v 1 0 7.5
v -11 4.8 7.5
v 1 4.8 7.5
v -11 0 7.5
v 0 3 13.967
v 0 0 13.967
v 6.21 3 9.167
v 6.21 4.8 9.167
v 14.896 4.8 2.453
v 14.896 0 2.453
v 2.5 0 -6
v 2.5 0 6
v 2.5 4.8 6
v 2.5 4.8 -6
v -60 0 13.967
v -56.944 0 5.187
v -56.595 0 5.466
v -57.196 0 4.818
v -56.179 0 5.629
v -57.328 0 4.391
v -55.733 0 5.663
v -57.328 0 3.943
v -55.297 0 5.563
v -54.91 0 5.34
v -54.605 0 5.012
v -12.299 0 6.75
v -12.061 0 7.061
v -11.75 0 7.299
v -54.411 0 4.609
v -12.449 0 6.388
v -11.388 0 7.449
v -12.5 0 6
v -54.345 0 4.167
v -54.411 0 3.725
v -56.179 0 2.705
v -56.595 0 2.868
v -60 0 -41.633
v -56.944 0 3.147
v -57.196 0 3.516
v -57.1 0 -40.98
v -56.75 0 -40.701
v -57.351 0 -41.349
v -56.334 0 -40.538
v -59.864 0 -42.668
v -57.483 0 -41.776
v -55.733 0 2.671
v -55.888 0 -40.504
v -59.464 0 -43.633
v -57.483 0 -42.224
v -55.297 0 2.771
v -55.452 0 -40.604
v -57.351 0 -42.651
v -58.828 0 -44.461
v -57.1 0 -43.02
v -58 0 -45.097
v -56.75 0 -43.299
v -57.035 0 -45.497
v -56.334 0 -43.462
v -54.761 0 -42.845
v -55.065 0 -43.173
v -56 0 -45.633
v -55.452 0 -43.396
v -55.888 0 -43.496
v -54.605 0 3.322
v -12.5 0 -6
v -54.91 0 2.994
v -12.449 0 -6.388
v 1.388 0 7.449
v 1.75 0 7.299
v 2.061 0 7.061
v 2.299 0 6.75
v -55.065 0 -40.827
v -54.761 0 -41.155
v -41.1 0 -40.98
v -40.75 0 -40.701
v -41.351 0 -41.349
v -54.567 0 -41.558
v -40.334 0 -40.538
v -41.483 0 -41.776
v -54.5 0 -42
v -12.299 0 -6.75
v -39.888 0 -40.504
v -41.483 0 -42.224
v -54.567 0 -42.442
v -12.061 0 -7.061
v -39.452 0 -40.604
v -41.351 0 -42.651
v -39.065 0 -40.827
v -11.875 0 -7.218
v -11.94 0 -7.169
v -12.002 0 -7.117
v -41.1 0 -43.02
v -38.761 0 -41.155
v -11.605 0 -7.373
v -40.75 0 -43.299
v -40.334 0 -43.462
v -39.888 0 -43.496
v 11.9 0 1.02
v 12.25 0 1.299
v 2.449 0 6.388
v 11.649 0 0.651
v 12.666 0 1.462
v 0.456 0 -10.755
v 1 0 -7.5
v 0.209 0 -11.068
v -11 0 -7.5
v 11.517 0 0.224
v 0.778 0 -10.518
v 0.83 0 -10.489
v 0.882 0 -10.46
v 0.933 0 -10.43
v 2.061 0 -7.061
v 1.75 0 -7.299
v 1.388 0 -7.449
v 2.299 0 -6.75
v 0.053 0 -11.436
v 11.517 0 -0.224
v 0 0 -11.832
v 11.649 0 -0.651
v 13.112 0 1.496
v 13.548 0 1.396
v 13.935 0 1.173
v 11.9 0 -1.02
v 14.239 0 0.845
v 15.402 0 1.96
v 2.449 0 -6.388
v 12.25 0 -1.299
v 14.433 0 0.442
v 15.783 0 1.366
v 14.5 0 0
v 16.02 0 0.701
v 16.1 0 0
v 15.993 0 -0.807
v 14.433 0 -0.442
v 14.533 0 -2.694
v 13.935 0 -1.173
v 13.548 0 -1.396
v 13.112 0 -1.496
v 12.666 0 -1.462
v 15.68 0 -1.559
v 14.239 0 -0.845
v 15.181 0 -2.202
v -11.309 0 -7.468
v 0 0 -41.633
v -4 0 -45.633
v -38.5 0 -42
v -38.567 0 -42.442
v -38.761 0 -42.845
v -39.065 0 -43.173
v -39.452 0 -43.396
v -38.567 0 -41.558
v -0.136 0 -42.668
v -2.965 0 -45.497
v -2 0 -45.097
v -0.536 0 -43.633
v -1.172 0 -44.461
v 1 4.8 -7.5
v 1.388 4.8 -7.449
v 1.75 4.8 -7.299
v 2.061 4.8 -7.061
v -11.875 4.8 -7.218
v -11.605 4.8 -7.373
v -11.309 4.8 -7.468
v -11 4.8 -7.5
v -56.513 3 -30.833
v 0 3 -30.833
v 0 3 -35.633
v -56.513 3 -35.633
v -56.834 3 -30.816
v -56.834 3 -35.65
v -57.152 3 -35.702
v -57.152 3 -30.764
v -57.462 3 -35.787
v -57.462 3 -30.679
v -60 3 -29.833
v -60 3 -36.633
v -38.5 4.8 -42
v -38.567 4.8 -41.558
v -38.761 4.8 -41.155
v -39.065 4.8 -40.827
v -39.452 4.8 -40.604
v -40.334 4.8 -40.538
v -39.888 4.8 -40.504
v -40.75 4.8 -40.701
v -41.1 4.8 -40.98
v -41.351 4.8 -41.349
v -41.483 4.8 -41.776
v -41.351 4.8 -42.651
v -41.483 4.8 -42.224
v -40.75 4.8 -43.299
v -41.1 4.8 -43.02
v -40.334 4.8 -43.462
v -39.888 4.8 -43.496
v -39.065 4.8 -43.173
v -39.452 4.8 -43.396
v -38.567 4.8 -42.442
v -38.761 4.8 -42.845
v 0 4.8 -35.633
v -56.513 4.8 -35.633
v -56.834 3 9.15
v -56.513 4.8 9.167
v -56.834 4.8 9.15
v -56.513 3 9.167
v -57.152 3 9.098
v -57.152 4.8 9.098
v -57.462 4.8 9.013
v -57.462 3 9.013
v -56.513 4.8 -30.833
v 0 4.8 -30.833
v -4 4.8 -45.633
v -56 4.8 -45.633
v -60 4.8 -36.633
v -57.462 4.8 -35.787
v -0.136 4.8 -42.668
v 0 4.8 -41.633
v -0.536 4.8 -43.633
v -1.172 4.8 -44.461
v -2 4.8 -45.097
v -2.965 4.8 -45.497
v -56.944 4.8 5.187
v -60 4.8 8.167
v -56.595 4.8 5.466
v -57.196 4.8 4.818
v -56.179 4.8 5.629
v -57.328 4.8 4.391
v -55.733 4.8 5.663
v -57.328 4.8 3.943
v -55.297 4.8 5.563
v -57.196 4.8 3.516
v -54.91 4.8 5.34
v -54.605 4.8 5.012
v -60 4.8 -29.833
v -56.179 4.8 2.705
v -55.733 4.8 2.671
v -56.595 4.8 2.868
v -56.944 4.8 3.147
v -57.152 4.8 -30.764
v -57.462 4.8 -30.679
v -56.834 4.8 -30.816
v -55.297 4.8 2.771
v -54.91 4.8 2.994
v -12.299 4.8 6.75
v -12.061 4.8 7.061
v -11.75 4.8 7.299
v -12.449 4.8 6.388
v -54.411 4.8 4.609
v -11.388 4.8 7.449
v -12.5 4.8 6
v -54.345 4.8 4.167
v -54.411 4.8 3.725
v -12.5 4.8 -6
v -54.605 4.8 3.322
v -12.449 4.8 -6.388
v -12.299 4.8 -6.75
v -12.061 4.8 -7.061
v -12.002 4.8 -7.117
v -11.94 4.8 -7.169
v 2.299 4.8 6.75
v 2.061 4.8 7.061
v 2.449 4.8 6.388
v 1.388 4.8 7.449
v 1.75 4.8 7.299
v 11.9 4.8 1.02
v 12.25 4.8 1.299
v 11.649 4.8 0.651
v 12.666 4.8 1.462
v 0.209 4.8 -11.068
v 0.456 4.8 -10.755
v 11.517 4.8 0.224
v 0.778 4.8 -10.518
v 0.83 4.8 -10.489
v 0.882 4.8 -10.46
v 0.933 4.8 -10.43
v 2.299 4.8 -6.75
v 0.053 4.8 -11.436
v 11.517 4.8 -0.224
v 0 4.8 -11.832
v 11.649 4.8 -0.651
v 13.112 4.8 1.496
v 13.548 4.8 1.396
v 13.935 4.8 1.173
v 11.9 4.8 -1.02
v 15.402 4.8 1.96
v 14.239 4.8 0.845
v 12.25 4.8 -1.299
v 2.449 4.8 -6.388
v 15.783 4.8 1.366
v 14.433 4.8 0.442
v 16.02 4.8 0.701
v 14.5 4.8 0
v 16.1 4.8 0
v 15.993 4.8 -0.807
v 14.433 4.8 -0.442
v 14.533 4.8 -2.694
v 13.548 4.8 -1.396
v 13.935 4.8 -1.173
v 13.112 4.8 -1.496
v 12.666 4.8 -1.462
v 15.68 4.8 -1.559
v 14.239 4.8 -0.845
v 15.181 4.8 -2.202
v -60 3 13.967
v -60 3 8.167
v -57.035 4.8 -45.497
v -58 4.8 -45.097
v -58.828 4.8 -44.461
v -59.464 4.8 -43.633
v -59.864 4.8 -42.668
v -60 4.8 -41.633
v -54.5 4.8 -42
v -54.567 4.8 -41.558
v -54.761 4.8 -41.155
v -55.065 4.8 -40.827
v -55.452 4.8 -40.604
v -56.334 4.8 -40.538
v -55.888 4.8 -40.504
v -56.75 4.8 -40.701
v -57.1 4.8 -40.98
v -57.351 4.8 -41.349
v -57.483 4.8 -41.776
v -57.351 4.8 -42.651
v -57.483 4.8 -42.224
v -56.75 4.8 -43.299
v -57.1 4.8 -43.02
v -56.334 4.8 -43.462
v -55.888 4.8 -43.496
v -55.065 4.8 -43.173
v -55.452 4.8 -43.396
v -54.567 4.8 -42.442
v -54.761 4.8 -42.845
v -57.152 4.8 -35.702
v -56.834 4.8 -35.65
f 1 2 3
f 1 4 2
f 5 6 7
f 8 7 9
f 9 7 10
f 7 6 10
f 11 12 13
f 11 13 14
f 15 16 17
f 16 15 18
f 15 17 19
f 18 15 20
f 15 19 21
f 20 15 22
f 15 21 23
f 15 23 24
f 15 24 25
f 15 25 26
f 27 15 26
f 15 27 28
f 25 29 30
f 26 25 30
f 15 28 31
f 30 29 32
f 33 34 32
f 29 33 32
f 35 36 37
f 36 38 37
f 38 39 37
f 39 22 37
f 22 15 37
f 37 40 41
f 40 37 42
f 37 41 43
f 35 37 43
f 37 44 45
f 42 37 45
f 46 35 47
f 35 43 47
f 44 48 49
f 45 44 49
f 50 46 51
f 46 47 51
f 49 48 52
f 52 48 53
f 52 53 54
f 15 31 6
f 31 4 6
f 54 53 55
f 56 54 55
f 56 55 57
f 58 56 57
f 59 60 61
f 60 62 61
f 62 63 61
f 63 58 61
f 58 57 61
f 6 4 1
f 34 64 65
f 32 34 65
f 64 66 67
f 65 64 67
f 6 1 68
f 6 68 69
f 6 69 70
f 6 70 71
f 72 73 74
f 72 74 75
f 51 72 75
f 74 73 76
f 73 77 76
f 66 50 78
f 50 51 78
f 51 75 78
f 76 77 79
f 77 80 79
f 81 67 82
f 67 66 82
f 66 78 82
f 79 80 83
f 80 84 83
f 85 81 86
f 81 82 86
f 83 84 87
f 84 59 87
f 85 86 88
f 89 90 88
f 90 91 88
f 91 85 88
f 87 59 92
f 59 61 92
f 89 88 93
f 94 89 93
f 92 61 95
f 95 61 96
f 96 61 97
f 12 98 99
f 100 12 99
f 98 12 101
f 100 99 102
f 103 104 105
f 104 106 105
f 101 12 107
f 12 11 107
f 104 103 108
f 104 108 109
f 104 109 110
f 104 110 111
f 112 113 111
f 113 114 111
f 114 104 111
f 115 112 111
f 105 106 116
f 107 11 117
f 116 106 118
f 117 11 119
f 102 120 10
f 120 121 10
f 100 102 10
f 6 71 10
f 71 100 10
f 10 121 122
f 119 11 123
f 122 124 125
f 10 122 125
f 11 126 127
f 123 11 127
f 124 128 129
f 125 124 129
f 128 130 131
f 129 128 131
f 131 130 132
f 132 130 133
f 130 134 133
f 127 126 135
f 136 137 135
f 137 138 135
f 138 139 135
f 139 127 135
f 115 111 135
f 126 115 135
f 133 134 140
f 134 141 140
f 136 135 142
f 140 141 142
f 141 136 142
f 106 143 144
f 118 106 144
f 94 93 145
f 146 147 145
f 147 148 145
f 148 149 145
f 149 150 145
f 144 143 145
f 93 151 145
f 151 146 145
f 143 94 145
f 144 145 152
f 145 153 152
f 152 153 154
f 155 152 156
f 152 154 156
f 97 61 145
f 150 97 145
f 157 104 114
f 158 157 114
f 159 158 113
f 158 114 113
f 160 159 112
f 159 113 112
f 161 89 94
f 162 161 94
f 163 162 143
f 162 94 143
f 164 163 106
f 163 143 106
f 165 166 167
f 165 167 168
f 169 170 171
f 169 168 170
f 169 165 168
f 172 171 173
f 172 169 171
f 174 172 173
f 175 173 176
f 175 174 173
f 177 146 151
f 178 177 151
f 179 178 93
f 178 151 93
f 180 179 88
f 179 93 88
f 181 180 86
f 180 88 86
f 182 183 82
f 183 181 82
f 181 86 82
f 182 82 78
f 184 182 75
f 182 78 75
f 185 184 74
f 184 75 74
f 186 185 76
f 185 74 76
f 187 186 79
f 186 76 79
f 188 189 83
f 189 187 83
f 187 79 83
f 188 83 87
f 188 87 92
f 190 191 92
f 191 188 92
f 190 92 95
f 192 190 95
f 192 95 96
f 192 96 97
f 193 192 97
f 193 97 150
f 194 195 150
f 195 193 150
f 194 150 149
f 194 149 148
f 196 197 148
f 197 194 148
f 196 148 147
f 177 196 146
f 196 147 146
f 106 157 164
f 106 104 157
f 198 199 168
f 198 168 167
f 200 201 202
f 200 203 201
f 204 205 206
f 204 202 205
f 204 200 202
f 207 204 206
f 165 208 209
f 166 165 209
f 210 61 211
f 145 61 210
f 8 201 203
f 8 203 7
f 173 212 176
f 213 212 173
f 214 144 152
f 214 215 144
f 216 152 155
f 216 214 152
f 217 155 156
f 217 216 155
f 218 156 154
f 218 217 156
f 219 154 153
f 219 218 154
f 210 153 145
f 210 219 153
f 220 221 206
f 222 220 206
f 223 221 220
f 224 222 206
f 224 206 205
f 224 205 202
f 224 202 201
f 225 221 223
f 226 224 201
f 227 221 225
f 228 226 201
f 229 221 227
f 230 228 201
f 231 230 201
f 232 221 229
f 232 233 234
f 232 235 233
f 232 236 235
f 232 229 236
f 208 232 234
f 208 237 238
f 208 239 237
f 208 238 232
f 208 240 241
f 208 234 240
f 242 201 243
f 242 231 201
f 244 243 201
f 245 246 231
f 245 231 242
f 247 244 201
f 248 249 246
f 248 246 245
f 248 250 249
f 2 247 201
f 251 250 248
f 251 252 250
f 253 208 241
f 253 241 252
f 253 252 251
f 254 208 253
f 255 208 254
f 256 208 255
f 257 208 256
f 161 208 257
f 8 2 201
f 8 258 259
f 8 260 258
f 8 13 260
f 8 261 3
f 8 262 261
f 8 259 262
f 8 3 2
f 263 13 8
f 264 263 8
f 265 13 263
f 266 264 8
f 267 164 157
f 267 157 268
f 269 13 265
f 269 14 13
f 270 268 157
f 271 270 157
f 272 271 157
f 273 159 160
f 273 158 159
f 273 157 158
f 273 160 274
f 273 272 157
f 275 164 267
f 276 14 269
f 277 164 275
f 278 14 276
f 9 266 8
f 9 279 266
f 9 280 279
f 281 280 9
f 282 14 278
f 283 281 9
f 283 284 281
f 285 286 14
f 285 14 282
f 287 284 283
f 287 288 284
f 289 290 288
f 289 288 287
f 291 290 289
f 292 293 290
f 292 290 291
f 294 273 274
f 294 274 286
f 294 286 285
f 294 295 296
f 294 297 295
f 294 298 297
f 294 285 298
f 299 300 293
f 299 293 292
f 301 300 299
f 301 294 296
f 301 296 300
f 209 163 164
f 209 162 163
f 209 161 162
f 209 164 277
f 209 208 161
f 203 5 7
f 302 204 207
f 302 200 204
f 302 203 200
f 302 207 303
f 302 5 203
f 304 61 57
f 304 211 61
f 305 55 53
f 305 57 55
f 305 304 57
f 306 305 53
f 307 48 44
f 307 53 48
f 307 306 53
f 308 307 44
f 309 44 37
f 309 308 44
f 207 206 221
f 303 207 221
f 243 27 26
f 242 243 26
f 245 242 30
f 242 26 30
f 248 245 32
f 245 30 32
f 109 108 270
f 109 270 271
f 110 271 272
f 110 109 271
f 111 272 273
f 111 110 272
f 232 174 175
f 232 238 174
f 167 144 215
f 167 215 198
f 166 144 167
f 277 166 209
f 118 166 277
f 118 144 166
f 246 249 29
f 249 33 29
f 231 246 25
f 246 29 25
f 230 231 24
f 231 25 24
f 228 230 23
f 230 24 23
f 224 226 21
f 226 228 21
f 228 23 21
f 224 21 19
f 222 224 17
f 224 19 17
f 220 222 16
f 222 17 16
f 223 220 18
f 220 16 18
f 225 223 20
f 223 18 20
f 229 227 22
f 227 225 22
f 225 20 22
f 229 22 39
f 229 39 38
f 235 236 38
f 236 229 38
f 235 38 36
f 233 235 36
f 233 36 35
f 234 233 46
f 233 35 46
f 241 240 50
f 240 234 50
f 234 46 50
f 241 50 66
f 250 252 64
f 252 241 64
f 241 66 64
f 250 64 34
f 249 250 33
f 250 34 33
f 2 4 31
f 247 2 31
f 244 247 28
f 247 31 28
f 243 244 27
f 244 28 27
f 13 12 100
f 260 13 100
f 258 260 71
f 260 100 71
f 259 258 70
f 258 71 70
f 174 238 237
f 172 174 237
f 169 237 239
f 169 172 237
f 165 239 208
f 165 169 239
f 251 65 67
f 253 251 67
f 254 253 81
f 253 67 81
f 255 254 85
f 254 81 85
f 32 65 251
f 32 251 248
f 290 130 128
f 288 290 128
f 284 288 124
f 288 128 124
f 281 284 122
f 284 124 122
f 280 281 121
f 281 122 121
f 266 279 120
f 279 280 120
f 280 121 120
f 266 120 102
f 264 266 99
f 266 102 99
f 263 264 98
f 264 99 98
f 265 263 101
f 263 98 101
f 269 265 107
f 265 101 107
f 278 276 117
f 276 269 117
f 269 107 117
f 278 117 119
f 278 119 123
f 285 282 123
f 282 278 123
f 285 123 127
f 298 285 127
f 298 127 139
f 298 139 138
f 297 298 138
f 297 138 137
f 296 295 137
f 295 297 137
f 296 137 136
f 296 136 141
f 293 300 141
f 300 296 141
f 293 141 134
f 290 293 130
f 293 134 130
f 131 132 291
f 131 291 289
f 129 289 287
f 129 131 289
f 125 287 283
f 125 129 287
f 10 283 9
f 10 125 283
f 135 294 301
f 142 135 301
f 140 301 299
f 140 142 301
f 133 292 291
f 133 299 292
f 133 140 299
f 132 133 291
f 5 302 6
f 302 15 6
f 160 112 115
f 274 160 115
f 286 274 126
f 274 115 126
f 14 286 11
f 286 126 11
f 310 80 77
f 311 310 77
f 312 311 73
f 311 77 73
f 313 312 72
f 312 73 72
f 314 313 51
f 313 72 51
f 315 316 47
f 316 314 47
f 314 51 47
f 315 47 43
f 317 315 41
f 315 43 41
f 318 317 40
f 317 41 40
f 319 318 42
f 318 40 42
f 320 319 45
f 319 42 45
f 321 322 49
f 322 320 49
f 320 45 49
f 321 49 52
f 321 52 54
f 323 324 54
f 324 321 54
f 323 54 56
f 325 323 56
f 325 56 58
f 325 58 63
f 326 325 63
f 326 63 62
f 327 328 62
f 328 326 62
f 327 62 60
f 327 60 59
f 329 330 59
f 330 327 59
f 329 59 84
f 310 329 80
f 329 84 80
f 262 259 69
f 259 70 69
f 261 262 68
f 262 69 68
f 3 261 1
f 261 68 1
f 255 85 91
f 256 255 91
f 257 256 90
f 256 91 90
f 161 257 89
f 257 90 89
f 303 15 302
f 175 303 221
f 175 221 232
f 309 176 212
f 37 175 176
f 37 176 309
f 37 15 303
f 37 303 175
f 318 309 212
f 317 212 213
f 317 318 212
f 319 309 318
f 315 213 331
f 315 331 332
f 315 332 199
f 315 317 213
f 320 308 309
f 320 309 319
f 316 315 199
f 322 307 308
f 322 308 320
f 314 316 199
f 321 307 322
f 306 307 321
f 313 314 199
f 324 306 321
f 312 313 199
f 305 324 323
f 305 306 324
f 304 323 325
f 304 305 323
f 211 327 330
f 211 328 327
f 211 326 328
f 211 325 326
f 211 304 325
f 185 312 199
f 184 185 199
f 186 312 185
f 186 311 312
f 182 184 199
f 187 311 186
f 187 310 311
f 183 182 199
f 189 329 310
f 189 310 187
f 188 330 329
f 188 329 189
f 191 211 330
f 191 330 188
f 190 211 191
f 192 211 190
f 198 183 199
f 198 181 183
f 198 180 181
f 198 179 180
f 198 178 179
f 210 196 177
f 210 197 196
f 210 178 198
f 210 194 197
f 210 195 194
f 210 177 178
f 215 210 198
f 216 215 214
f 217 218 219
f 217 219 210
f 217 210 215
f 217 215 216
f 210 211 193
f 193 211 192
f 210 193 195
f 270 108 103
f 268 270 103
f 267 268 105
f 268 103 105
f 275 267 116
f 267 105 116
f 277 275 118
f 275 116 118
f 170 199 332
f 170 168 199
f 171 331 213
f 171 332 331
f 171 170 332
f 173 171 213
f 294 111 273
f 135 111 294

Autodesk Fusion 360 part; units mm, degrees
sketch "Sketch1" plane through (0, 0, 0) normal (0, 1, 0) x (1, 0, 0)
  circle A0 centre (0, 0) radius 48 construction
  circle A1 centre (0, 0) radius 14 construction
  circle A2 centre (0, 0) radius 9.5 construction
  circle A3 centre (0, 0) radius 8 construction
  line L0 (0, 0) -> (8, 0) construction
  line L1 (0, 0) -> (0, -9.5) construction
  line L2 (0, 0) -> (-8, 0) construction
  line L3 (0, 0) -> (0, 9.5) construction
  circle A4 centre (8, 0) radius 1.5 construction
  circle A5 centre (-8, 0) radius 1.5 construction
  circle A6 centre (0, 9.5) radius 1.5 construction
  circle A7 centre (0, 0) radius 12 construction
  line L4 (8, 0) -> (18, 0) construction
  line L5 (21.1, 0) -> (19.55, 2.6847) construction
  line L6 (19.55, 2.6847) -> (16.45, 2.6847) construction
  line L7 (16.45, 2.6847) -> (14.9, 0) construction
  line L8 (14.9, 0) -> (16.45, -2.6847) construction
  line L9 (16.45, -2.6847) -> (19.55, -2.6847) construction
  line L10 (19.55, -2.6847) -> (21.1, 0) construction
  circle A8 centre (18, 0) radius 3.1 construction
  circle A9 centre (18, 0) radius 1.5
  line L11 (0, 52) -> (-68, 52) construction
  line L12 (-9.7468, 47) -> (-68, 47) construction
  line L13 (-68, 52) -> (-68, 47) construction
  line L14 (-68, 47) -> (-68, 35.633) construction
  line L15 (-68, 35.633) -> (-32.1604, 35.633) construction
  line L16 (-68, 35.633) -> (-68, 30.833) construction
  line L17 (-68, 30.833) -> (-36.7876, 30.833) construction
  line L18 (-68, 30.833) -> (-68, -9.167) construction
  line L19 (-60, -9.167) -> (-47.1165, -9.167)
  line L20 (-68, -9.167) -> (-68, -13.967) construction
  line L21 (-68, -13.967) -> (-45.923, -13.967) construction
  line L22 (-60, -13.967) -> (-60, 35.633)
  line L23 (5.9333, 10.4305) -> (19.5328, 2.6945)
  line L24 (-60, -13.967) -> (21.1, -13.967)
  line L25 (21.1, -13.967) -> (21.1, 0) construction
  arc A10 (21.1, 0) -> (19.5328, 2.6945) centre (18, 0) ccw
  line L26 (-60, 35.633) -> (5, 35.633)
  line L27 (5, 35.633) -> (5, 11.8322)
  arc A11 (5.9333, 10.4305) -> (5.7778, 10.5175) centre (0, 0) ccw
  arc A12 (5, 11.8322) -> (5.7778, 10.5175) centre (6.5, 11.8322) ccw
  arc A13 (5.7778, 10.5175) -> (7.9656, 11.513) centre (6.5, 11.8322) ccw construction
  arc A14 (5.4445, 12.898) -> (5, 11.8322) centre (6.5, 11.8322) ccw construction
  arc A15 (7.9656, 11.513) -> (5.4445, 12.898) centre (6.5, 11.8322) ccw construction
  line L28 (5, 11.8322) -> (5, 10.9087) construction
  arc A16 (5.7778, 10.5175) -> (5, 10.9087) centre (0, 0) ccw construction
  line L29 (-60, 30.833) -> (5, 30.833)
  line L30 (-47.1165, -9.167) -> (21.1, -9.167)
  line L31 (-60, 35.633) -> (-60, 45.633)
  line L32 (-60, 45.633) -> (5, 45.633)
  line L33 (5, 45.633) -> (5, 35.633)
  circle A17 centre (-56, 42) radius 1.5
  circle A18 centre (-40, 42) radius 1.5
  line L34 (-40, 42) -> (0, 0) construction
  circle A19 centre (-55.8448, -4.167) radius 1.5
  line L35 (0, 0) -> (-55.8448, -4.167) construction
  line L36 (-68, -9.167) -> (-60, -9.167) construction
  line L37 (-6, -7.5) -> (7.5, -7.5)
  line L38 (7.5, -7.5) -> (7.5, 7.5)
  line L39 (6, 7.5) -> (-7.5, 7.5)
  line L40 (-7.5, 7.5) -> (-7.5, -7.5)
  line L41 (-7.5, -7.5) -> (7.5, 7.5) construction
  line L42 (-7.5, 7.5) -> (7.5, -7.5) construction
  arc A20 (-7.5, -6) -> (-7.0607, -7.0607) centre (-6, -6) ccw
  arc A21 (-7.0607, -7.0607) -> (-6, -7.5) centre (-6, -6) ccw
  line L43 (-7.5, -7.5) -> (-6, -7.5)
  arc A22 (-6, -7.5) -> (-4.602, -6.5438) centre (-6, -6) ccw construction
  arc A23 (-4.9393, -4.9393) -> (-7.5, -6) centre (-6, -6) ccw construction
  arc A24 (-4.602, -6.5438) -> (-4.9393, -4.9393) centre (-6, -6) ccw construction
  arc A25 (6, -7.5) -> (7.0607, -7.0607) centre (6, -6) ccw
  arc A26 (7.0607, -7.0607) -> (7.5, -6) centre (6, -6) ccw
  arc A27 (7.5, -6) -> (6.5438, -4.602) centre (6, -6) ccw construction
  arc A28 (4.9393, -4.9393) -> (6, -7.5) centre (6, -6) ccw construction
  arc A29 (6.5438, -4.602) -> (4.9393, -4.9393) centre (6, -6) ccw construction
  arc A30 (7.0607, 7.0607) -> (6, 7.5) centre (6, 6) ccw
  arc A31 (7.5, 6) -> (7.0607, 7.0607) centre (6, 6) ccw
  arc A32 (6, 7.5) -> (6.5438, 4.602) centre (6, 6) ccw construction
  arc A33 (7.4916, 5.8417) -> (7.5, 6) centre (6, 6) ccw construction
  arc A34 (6.5438, 4.602) -> (7.4916, 5.8417) centre (6, 6) ccw construction
  arc A35 (-7.0607, 7.0607) -> (-7.5, 6) centre (-6, 6) ccw
  arc A36 (-6.8748, 7.2185) -> (-7.0607, 7.0607) centre (-6, 6) ccw
  arc A37 (-6, 7.5) -> (-6.8748, 7.2185) centre (-6, 6) ccw
  arc A38 (-7.5, 6) -> (-4.8256, 5.0669) centre (-6, 6) ccw construction
  arc A39 (-4.602, 6.5438) -> (-6, 7.5) centre (-6, 6) ccw construction
  arc A40 (-4.8256, 5.0669) -> (-4.602, 6.5438) centre (-6, 6) ccw construction
  line L44 (7.5, 7.5) -> (6, 7.5)
  line L45 (5, 11.8322) -> (5, -13.967) construction
  line L46 (5, -13.967) -> (19.8959, -2.4527)
  line L47 (18, 0) -> (21.1, 0) construction
  line L48 (18, 0) -> (19.8959, -2.4527) construction
  arc A41 (19.8959, -2.4527) -> (21.1, 0) centre (18, 0) ccw
  point P0 (18, 0)
  point P1 (-33.1034, 34.7586)
  point P2 (-47.8669, -3.5717)
  dimension "d1" = 96
  dimension "d2" = 28
  dimension "d3" = 19
  dimension "d4" = 16
  dimension "d5" = 3
  dimension "d6" = 3
  dimension "d7" = 3
  dimension "d8" = 24
  dimension "d9" = 18
  dimension "d10" = 3.1
  dimension "d11" = 60
  dimension "d12" = 3
  dimension "d13" = 52
  dimension "d14" = 68
  dimension "d15" = 68
  dimension "d18" = 5
  dimension "d22" = 16.367
  dimension "d23" = 4.8
  dimension "d24" = 40
  dimension "d25" = 4.8
  dimension "d26" = 8
  dimension "d27" = 3.1
  dimension "d28" = 5
  dimension "d33" = 12
  dimension "d34" = 3
  dimension "d35" = 10
  dimension "d36" = 3
  dimension "d37" = 12
  dimension "d38" = 5
  dimension "d39" = 3
  dimension "d40" = 5
  dimension "d41" = 10
  dimension "d42" = 3
  dimension "d43" = 5
  dimension "d44" = 8
  dimension "d66" = 7.5
  dimension "d67" = 7.5
  dimension "d68" = 15
  dimension "d69" = 15
  dimension "d70" = 3
  dimension "d71" = 3
  dimension "d72" = 3
  dimension "d73" = 3
extrude "Extrude1" add sketch "Sketch1" along normal blind 4.8 contours L19 L22 L23 A10 L27 A11 A12 L29 L30 L46 A41 | L19 L22 L24 L30 L46 | L22 L26 L27 L29 | L26 L31 L32 L33 | L40 A20 A21 L43 | L37 L38 A25 A26 | L39 L40 A35 A36 A37 | L38 A30 A31 L44 makes body 1
fillet "Fillet1" radius 4 2 edges at (5, 2.4, -45.633) (-60, 2.4, -45.633) on bodies 1
sketch "Sketch2" plane through (0, 4.8, 0) normal (0, 1, 0) x (-1, 0, 0)
  arc A0 (56, -45.633) -> (60, -41.633) centre (56, -41.633) ccw
  line L0 (60, -41.633) -> (60, 13.967)
  line L1 (60, 13.967) -> (-5, 13.967)
  arc A1 (-19.8959, 2.4527) -> (-19.5328, -2.6945) centre (-18, 0) ccw
  line L2 (-19.5328, -2.6945) -> (-5.9333, -10.4305)
  arc A2 (-5.9333, -10.4305) -> (-5.7778, -10.5175) centre (0, 0) ccw
  arc A3 (-5, -11.8322) -> (-5.7778, -10.5175) centre (-6.5, -11.8322) ccw
  line L3 (-5, -11.8322) -> (-5, -41.633)
  arc A4 (-5, -41.633) -> (-1, -45.633) centre (-1, -41.633) ccw
  line L4 (-1, -45.633) -> (56, -45.633)
  circle A5 centre (40, -42) radius 1.5
  circle A6 centre (56, -42) radius 1.5
  line L5 (47.1165, 9.167) -> (-21.1, 9.167)
  line L6 (60, 9.167) -> (47.1165, 9.167)
  line L7 (60, -30.833) -> (-5, -30.833)
  line L8 (60, -35.633) -> (-5, -35.633)
  line L9 (-5, 13.967) -> (60, 13.967)
  line L10 (60, 13.967) -> (60, 9.167)
  line L11 (57, 9.167) -> (-5, 9.167)
  line L12 (-5, 9.167) -> (-5, 13.967)
  line L13 (-5, -30.833) -> (57, -30.833)
  line L14 (60, -30.833) -> (60, -35.633)
  line L15 (57, -35.633) -> (-5, -35.633)
  line L16 (-5, -35.633) -> (-5, -30.833)
  line L17 (57, 9.167) -> (60, 8.167)
  line L18 (60, 8.167) -> (60, 9.167)
  line L19 (60, 9.167) -> (57, 9.167) construction
  line L20 (57, -30.833) -> (60, -29.833)
  line L21 (60, -30.833) -> (60, -29.833)
  line L22 (60, -35.633) -> (60, -36.633)
  line L23 (60, -36.633) -> (57, -35.633)
  line L24 (57, -35.633) -> (57, -30.833) construction
  line L25 (57, 9.167) -> (57, -30.833) construction
  line L26 (57, -30.833) -> (60, -30.833) construction
  line L27 (60, -35.633) -> (57, -35.633) construction
  line L28 (-5, 13.967) -> (-19.8959, 2.4527)
  circle A7 centre (-18, 0) radius 1.5
  arc A8 (6, -7.5) -> (7.5, -6) centre (6, -6) ccw
  line L29 (6, -7.5) -> (-6, -7.5)
  arc A9 (-7.5, -6) -> (-6, -7.5) centre (-6, -6) ccw
  line L30 (-7.5, -6) -> (-7.5, 6)
  arc A10 (-6, 7.5) -> (-7.5, 6) centre (-6, 6) ccw
  line L31 (-6, 7.5) -> (6, 7.5)
  arc A11 (7.5, 6) -> (6, 7.5) centre (6, 6) ccw
  line L32 (7.5, 6) -> (7.5, -6)
  circle A12 centre (55.8448, 4.167) radius 1.5
  line L33 (-5, 9.167) -> (-11.2097, 9.167)
  line L34 (-5, 13.967) -> (-11.2097, 9.167)
  dimension "d60" = 3
  dimension "d61" = 1
  dimension "d62" = 1
  dimension "d63" = 1
extrude "Extrude4" cut sketch "Sketch2" against normal blind 1.8 contours L0 L8 L22 L23 | L0 L3 L7 L8 L13 L14 L15 L16 | L0 L7 L20 L21 | L0 L6 L17 L18 | L0 L1 L5 L6 L9 L10 L11 L12 | L5 L12 L28 L33 L34 bodies 1
fillet "Fillet2" radius 3 3 edges at (-57, 3.9, 9.167) (-57, 3.9, -30.833) (-57, 3.9, -35.633) on bodies 1
ref_plane "WorkPlane1" through (-30, 0, 0) normal (1, 0, 0) x (0, 1, 0)
ref_plane "WorkPlane2" through (-25, 0, 0) normal (1, 0, 0) x (0, 1, 0)
split "Split1" by plane through (-30, 0, 0) normal (1, 0, 0) bodies 1 makes body 2 at (-11.8075, 0, -32.9017)
split "Split2" by plane through (-25, 0, 0) normal (1, 0, 0) bodies 2 makes body 3 at (-8.8075, 0, -31.5684)
delete_body "RemoveBody1" bodies 2
move_body "Move1" bodies 3 to x (1, 0, 0) y (0, 1, 0) z (0, 0, 1) at (-5, 0, 0)
combine "Combine1" operation add target body 1 tool bodies 3
